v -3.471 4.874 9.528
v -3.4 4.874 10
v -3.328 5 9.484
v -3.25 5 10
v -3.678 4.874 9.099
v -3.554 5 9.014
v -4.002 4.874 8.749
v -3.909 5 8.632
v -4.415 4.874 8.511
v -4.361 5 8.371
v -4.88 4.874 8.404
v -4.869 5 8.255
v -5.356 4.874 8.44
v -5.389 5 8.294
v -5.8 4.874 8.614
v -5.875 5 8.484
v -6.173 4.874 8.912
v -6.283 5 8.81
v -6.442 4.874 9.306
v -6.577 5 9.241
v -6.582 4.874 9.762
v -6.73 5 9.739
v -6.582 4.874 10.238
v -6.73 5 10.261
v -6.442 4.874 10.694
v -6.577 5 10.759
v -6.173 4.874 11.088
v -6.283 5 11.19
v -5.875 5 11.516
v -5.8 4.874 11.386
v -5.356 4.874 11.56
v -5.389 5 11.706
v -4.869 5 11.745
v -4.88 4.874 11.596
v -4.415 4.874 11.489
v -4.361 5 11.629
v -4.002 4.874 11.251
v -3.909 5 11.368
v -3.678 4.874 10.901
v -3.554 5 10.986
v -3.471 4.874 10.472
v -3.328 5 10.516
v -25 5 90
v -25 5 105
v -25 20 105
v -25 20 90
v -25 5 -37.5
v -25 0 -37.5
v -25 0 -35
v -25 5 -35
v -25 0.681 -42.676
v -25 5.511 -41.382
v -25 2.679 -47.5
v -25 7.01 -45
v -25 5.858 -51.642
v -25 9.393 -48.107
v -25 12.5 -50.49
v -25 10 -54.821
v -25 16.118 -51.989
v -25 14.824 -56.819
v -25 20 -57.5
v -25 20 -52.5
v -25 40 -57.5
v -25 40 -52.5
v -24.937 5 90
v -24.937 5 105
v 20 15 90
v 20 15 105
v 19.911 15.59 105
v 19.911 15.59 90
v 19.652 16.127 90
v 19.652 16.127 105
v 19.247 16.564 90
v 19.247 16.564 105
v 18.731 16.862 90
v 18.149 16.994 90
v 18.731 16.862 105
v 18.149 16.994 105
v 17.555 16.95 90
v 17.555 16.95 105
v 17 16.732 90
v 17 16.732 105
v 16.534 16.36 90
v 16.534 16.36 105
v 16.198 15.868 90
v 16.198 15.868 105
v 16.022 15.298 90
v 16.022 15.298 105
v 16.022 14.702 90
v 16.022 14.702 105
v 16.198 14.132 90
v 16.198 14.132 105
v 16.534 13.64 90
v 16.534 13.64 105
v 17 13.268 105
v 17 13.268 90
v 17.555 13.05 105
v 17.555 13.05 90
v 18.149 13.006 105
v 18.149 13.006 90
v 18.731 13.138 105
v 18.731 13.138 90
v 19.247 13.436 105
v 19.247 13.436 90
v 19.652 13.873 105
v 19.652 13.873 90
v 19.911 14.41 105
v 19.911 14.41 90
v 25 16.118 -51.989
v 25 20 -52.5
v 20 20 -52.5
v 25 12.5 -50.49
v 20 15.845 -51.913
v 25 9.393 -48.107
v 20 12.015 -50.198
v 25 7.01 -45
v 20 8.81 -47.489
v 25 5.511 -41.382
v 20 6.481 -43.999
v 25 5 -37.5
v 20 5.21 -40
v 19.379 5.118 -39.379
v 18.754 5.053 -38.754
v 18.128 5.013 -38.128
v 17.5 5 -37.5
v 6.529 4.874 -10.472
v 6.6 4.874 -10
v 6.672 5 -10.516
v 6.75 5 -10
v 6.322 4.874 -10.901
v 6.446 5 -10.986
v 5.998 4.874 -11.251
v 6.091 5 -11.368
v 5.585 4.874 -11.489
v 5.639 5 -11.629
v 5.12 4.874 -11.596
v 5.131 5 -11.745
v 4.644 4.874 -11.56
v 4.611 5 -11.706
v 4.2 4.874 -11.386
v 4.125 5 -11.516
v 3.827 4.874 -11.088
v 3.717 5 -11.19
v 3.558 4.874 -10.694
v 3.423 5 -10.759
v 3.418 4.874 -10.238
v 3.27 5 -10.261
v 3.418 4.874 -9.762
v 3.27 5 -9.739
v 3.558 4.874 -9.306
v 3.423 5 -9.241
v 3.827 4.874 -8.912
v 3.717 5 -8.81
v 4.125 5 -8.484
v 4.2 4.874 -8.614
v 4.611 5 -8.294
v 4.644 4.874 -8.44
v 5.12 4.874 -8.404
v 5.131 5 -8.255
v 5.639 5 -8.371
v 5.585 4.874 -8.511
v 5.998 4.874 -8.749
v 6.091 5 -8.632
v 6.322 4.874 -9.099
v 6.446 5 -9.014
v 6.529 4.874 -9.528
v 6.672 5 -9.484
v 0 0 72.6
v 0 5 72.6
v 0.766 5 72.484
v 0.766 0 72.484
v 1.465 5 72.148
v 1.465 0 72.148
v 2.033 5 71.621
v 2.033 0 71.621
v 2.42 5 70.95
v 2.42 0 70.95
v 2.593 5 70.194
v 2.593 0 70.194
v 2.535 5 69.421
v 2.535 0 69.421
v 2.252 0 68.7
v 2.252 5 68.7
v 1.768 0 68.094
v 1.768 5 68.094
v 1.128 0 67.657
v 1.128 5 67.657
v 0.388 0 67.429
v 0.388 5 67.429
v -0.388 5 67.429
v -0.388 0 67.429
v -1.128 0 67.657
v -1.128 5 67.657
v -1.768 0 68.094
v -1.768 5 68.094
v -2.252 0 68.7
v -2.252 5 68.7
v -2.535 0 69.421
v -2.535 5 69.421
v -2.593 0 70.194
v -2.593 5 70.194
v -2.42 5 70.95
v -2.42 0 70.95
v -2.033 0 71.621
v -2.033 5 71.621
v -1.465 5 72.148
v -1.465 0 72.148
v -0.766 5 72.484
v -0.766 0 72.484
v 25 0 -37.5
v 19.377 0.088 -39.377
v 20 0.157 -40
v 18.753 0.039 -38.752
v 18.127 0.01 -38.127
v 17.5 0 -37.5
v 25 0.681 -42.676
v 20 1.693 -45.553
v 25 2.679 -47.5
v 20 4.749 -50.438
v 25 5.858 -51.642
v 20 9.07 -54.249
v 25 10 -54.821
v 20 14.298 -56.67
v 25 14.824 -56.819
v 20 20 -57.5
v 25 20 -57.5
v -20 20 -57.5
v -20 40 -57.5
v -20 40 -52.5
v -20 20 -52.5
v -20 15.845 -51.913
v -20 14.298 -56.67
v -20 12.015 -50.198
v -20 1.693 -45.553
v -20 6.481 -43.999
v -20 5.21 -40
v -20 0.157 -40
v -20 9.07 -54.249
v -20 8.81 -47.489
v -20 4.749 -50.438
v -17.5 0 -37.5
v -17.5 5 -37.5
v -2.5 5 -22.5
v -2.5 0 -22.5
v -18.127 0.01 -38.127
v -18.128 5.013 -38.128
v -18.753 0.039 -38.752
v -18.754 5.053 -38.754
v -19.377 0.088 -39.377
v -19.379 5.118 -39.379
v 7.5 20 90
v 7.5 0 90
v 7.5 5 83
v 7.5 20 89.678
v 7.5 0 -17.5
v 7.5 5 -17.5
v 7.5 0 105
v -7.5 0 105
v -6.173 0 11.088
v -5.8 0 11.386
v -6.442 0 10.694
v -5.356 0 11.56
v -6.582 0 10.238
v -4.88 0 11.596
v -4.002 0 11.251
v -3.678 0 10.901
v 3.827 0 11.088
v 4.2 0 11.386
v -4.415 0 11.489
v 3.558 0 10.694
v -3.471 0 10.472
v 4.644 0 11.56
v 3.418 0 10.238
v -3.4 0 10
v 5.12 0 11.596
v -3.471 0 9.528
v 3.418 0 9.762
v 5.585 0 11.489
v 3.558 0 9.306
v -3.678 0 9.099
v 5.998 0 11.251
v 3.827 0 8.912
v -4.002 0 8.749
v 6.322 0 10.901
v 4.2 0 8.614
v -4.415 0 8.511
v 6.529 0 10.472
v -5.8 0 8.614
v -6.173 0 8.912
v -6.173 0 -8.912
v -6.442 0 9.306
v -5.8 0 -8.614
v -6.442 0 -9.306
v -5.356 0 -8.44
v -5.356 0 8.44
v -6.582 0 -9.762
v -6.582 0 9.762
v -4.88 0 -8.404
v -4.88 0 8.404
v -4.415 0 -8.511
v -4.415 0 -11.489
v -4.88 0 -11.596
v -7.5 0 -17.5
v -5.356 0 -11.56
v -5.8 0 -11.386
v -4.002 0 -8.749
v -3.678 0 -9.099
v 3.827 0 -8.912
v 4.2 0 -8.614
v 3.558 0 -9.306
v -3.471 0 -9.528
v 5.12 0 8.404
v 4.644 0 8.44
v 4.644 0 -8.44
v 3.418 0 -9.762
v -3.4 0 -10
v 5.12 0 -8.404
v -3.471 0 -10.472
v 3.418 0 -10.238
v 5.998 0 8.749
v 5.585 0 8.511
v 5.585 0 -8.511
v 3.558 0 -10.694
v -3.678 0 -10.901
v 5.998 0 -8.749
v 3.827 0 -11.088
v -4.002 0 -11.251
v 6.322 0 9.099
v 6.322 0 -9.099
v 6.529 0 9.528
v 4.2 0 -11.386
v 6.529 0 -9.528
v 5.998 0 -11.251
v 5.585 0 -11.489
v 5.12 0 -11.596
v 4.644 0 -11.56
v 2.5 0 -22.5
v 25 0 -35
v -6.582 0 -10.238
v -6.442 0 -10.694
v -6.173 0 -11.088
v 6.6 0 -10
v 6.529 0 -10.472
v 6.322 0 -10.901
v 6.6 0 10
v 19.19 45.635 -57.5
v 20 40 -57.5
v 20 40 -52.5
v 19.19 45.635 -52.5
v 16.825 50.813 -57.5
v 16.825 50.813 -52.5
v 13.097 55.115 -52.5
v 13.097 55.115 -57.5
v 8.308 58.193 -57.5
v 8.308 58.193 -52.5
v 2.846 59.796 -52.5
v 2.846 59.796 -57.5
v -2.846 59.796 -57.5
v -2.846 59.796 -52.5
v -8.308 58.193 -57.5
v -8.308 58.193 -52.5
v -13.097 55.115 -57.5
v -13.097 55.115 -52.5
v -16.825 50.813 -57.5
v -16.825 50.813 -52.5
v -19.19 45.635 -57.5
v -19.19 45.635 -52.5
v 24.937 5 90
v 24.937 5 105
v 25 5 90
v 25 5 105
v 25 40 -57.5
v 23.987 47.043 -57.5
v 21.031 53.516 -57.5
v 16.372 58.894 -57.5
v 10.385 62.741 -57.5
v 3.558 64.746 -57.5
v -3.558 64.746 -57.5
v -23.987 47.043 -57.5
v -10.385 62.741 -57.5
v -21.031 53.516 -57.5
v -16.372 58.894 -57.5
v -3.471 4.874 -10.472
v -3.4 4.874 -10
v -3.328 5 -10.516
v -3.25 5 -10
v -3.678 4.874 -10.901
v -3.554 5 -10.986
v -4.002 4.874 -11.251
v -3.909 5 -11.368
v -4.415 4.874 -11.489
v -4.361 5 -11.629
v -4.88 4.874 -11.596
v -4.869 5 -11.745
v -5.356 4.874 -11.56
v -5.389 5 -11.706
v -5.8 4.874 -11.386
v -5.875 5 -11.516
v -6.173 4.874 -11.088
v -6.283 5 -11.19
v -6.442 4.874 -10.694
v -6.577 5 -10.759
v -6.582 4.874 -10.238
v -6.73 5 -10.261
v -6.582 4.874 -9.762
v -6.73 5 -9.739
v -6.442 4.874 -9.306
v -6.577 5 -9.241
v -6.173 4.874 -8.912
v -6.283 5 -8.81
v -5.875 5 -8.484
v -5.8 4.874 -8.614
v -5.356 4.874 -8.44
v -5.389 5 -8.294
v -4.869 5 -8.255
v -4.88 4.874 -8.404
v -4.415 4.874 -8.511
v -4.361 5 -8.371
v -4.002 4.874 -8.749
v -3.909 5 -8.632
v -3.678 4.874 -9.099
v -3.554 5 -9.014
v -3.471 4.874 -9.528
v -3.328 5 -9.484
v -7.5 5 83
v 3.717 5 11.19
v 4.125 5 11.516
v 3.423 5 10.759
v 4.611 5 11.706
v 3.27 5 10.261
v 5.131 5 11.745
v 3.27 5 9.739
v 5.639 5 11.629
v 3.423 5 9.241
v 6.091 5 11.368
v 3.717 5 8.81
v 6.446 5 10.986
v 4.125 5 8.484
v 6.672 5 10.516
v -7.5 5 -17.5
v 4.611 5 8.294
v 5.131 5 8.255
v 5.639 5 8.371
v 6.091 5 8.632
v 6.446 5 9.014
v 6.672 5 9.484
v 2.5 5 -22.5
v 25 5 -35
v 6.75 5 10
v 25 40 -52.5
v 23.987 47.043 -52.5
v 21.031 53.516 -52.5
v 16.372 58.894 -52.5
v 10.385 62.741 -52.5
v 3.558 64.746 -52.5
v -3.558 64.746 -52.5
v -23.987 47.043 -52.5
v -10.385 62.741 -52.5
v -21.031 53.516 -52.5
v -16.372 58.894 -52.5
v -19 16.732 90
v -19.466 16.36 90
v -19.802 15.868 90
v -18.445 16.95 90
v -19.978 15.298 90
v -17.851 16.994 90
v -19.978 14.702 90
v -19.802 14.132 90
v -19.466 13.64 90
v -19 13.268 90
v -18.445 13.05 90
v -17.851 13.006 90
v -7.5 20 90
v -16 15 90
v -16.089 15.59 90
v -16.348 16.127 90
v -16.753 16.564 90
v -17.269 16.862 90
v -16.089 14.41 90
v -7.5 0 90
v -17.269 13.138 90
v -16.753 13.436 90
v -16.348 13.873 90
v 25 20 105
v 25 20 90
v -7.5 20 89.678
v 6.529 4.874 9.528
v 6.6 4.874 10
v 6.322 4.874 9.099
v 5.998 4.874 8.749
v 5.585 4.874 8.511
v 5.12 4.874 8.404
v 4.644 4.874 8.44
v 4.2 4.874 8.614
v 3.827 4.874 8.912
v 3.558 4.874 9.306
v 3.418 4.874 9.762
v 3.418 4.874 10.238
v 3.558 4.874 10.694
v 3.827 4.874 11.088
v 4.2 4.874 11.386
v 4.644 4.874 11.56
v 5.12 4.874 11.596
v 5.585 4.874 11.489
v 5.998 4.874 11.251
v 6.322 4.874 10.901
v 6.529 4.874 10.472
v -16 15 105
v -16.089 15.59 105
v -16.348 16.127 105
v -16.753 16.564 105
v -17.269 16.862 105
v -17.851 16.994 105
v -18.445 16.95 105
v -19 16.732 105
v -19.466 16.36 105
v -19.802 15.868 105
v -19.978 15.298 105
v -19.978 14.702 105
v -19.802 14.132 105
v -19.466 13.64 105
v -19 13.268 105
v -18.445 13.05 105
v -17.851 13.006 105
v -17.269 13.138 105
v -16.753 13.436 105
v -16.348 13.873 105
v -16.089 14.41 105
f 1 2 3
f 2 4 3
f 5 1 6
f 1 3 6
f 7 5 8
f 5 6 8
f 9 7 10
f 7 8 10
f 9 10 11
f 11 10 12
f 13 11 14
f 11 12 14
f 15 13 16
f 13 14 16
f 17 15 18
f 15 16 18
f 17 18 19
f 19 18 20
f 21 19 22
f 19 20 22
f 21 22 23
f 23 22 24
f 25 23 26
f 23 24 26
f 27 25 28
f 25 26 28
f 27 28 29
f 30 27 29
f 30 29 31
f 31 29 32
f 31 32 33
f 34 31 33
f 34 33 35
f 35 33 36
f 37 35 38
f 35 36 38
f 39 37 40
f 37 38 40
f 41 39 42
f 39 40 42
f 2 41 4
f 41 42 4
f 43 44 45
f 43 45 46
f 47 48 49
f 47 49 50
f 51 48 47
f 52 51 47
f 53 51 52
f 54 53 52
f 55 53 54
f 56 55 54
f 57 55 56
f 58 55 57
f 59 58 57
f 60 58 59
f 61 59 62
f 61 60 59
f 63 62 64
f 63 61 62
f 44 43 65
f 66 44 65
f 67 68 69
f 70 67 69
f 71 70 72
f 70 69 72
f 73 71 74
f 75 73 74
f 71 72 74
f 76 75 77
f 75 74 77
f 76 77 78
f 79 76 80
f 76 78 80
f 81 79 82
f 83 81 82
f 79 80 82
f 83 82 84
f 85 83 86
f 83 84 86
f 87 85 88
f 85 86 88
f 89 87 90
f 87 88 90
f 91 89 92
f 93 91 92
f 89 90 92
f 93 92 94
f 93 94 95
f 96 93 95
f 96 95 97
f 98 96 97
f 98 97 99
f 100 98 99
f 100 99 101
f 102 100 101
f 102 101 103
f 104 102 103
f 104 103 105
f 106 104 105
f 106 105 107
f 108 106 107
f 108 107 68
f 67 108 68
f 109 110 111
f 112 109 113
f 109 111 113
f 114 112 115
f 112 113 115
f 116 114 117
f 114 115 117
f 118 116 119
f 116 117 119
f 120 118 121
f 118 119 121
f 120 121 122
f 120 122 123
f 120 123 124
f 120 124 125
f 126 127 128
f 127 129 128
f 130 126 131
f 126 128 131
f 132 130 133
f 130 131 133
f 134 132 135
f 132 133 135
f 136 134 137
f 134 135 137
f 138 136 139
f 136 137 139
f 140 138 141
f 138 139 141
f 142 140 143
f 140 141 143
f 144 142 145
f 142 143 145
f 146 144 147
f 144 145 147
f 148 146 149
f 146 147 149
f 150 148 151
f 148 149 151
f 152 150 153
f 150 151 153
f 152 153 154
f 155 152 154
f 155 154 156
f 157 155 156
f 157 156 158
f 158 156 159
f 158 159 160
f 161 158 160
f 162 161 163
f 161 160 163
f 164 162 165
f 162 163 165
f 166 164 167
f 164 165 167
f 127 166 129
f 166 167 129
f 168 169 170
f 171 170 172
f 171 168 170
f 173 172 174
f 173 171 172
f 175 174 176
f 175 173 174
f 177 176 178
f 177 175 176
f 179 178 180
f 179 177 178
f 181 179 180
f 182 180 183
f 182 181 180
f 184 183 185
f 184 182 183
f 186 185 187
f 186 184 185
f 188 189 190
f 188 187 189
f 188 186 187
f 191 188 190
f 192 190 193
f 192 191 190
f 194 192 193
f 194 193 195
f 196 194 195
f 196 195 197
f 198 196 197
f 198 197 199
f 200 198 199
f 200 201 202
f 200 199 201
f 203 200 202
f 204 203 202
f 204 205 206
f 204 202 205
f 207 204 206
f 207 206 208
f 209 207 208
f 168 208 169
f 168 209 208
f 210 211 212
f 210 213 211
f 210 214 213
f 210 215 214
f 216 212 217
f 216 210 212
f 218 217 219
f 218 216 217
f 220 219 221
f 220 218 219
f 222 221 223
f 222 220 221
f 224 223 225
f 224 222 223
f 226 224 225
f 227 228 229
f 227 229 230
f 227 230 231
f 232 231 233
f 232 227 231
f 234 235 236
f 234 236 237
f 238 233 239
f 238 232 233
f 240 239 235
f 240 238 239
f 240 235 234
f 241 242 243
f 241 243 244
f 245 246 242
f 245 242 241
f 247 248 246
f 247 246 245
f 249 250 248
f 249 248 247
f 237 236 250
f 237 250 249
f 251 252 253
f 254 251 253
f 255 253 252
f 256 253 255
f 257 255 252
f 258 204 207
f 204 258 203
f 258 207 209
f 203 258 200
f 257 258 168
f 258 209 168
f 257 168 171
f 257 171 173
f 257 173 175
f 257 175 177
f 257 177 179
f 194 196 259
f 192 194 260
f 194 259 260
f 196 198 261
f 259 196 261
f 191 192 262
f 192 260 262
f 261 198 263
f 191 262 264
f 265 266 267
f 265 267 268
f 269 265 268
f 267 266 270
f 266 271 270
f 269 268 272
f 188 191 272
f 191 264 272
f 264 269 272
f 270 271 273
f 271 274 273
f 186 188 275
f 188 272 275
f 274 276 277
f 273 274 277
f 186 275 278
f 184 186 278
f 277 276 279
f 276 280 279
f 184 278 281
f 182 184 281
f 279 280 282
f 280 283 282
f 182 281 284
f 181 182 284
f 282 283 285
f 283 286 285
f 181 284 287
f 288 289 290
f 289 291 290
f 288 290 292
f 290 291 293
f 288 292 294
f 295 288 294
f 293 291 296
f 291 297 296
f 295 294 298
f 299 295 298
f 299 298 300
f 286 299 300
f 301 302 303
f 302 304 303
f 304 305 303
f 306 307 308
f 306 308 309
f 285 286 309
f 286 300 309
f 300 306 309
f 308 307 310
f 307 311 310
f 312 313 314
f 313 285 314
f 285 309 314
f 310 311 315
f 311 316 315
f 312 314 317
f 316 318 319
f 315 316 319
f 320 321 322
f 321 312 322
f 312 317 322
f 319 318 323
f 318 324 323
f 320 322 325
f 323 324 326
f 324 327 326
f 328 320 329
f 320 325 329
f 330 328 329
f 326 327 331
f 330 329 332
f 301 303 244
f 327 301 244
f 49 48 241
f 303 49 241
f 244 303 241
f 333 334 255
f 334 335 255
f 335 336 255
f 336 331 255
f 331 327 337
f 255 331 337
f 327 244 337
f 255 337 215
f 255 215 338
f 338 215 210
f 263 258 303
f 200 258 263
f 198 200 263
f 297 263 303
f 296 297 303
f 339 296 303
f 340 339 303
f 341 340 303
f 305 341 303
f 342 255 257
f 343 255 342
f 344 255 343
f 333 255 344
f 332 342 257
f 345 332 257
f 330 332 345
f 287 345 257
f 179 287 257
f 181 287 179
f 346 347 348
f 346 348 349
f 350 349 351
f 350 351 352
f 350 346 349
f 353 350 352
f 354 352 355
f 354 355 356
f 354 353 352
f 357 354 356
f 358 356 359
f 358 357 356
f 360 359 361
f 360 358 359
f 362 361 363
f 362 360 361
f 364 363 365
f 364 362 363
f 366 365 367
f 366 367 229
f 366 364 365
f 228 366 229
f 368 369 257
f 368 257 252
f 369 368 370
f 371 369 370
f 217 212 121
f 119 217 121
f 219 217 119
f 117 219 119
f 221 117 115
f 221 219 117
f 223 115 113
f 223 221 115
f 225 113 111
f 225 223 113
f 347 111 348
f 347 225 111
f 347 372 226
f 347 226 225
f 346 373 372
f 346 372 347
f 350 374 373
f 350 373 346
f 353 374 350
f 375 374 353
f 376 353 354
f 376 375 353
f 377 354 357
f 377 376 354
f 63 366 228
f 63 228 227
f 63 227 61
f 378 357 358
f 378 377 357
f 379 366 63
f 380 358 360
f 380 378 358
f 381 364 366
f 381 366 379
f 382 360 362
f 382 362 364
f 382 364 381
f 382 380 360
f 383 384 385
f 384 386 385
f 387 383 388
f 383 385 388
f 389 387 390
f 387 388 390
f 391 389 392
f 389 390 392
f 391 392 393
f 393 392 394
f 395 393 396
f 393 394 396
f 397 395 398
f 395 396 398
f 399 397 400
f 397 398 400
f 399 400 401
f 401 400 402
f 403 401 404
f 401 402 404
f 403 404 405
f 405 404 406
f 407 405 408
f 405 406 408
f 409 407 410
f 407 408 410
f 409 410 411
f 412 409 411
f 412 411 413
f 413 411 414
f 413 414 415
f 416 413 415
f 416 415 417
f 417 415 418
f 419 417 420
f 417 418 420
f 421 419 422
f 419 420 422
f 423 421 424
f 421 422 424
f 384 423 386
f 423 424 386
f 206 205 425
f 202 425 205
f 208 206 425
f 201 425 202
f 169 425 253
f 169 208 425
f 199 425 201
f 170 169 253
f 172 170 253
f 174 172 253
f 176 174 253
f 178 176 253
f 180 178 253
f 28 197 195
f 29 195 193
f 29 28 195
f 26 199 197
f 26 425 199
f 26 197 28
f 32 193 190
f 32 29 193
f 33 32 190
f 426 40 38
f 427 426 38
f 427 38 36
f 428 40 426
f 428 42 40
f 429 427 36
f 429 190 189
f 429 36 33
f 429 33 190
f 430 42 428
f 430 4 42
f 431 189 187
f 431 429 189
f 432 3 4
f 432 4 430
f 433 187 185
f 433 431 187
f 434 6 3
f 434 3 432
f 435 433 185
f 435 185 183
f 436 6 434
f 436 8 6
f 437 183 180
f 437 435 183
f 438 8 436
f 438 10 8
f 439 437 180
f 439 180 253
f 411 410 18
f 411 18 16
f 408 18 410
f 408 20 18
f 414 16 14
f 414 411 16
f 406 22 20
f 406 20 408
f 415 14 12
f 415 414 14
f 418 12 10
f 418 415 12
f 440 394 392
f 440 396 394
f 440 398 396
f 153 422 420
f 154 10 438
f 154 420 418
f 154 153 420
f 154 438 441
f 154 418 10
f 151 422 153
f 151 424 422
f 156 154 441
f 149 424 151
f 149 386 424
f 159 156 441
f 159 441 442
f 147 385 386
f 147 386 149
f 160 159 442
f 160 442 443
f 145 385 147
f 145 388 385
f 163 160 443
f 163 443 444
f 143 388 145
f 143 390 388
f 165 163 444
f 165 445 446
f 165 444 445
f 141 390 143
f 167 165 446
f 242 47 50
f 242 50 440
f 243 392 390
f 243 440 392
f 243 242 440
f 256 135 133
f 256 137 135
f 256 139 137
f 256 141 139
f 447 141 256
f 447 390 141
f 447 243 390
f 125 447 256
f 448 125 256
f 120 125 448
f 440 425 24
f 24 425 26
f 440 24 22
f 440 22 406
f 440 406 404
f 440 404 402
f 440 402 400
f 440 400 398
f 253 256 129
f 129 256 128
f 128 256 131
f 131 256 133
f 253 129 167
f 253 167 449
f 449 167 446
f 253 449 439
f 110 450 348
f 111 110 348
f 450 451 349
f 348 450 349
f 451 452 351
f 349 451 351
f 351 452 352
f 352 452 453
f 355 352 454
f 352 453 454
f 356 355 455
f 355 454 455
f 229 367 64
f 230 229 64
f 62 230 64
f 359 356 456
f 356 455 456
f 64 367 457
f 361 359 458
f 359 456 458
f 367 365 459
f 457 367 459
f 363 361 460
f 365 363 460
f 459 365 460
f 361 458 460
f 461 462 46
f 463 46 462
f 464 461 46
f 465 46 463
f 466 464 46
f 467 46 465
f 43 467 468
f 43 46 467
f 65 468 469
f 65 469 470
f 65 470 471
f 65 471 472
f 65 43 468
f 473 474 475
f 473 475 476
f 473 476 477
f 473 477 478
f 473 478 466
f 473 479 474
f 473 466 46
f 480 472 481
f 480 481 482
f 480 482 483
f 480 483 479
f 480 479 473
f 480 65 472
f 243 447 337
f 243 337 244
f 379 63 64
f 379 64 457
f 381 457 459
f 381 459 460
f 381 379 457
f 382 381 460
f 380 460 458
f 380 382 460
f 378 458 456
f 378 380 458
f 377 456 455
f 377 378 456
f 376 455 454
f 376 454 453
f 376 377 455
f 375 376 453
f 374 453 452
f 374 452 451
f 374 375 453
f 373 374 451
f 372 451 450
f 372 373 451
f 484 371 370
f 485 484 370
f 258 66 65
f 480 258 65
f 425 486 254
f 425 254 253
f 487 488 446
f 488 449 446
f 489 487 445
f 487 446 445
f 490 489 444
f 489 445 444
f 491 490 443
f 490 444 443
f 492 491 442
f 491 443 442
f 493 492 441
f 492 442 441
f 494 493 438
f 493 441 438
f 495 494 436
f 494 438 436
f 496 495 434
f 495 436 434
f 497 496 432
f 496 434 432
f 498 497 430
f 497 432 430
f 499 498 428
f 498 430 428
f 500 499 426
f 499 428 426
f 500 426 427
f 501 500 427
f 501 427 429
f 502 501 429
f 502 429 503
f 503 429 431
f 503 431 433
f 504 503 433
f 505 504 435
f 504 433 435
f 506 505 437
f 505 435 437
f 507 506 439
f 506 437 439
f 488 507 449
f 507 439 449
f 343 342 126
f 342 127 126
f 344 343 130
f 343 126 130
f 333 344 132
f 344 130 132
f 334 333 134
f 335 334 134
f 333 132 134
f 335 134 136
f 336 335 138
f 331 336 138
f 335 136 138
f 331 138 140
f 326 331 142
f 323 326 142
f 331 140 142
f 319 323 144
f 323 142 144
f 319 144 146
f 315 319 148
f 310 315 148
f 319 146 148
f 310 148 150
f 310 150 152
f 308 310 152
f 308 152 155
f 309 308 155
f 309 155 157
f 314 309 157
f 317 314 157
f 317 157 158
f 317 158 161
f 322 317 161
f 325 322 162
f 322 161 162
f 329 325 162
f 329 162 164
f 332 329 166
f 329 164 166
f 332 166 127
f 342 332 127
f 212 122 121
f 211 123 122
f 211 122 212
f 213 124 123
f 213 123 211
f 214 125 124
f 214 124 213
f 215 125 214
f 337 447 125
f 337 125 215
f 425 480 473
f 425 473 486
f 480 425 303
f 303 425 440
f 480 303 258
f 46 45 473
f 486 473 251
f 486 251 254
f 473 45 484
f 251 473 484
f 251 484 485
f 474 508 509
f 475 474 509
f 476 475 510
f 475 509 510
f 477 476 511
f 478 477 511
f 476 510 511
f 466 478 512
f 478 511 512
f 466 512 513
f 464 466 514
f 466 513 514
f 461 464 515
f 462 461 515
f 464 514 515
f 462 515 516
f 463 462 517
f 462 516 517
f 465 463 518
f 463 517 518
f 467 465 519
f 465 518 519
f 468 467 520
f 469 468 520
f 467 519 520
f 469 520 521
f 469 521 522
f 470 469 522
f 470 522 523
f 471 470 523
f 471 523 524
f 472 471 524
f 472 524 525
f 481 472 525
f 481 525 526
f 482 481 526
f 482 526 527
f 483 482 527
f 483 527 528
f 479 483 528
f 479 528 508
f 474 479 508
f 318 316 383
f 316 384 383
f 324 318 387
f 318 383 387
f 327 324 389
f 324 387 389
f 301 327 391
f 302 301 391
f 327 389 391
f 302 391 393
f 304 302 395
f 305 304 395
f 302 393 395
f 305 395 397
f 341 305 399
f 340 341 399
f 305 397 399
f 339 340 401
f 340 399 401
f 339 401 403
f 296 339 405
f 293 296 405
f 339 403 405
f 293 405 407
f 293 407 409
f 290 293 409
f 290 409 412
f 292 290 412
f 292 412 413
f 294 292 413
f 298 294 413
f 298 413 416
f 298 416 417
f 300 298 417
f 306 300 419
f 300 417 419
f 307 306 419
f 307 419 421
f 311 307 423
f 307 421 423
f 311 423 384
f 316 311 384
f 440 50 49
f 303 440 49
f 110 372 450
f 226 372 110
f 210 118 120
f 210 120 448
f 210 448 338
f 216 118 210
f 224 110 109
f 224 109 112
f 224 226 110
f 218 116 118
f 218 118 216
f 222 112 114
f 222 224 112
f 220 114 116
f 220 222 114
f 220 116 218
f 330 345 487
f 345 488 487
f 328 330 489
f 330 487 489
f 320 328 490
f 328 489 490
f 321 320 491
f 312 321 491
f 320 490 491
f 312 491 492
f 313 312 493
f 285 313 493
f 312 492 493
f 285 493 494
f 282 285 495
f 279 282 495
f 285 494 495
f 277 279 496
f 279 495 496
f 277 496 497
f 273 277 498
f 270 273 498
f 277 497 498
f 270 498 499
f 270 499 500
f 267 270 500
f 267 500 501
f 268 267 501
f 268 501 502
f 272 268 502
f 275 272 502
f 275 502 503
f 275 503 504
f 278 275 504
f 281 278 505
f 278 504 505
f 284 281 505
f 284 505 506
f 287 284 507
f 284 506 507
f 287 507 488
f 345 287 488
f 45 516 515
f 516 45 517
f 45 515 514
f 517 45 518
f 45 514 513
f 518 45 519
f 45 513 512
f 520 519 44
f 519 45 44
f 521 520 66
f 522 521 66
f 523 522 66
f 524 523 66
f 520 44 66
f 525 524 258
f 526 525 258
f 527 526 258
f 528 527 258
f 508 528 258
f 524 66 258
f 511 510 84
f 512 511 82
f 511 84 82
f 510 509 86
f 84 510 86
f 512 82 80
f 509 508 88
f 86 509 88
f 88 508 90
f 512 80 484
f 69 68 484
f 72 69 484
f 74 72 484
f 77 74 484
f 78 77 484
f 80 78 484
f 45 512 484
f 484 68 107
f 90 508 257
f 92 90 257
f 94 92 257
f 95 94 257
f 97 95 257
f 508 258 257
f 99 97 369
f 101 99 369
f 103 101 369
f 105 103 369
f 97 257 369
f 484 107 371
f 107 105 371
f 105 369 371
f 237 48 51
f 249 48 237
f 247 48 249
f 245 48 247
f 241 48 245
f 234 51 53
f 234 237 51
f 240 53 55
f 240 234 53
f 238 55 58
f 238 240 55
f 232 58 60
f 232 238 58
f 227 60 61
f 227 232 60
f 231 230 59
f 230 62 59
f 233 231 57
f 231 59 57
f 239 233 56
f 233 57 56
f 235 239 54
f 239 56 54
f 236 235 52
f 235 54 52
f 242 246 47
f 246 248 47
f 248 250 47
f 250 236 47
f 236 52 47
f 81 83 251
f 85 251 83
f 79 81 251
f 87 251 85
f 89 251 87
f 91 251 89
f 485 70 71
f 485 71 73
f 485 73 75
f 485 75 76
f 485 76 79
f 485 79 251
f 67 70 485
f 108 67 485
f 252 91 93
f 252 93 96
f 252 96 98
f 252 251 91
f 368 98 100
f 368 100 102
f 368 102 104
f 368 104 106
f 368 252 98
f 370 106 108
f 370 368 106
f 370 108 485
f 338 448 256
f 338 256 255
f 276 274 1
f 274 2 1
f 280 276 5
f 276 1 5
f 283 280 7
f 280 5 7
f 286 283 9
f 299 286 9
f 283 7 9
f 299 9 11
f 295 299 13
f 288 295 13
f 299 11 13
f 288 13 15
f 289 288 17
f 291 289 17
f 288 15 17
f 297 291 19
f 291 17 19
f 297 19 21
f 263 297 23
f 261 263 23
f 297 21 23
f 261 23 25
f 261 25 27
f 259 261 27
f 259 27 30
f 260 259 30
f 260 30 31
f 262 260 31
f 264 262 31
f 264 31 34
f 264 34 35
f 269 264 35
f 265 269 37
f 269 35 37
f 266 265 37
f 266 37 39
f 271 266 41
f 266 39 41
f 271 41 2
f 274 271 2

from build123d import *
from OCP.BRepFilletAPI import BRepFilletAPI_MakeChamfer

# Parameters (mm, degrees)
SKETCH1_W           = 15
SKETCH1_H           = 27.5
SKETCH1_W_2         = 10
SKETCH1_H_2         = 20
BOSS_EXTRUDE1_DEPTH = 5
SKETCH8_W           = 15
SKETCH8_H           = 90
BOSS_EXTRUDE2_DEPTH = 5
SKETCH9_R           = 2.6
CUT_EXTRUDE1_DEPTH  = 11
SKETCH11_W          = 50
SKETCH11_H          = 15
BOSS_EXTRUDE4_DEPTH = 15
CHAMFER1_SIZE       = 5
CHAMFER1_SIZE_2     = 17.437072219
CHAMFER2_SIZE       = 15.722257417
CHAMFER2_SIZE_2     = 7
SKETCH12_R          = 2
CUT_EXTRUDE2_DEPTH  = 122.783619588
SKETCH13_W          = 15
SKETCH13_H          = 10
BOSS_EXTRUDE5_DEPTH = 5
SKETCH15_W          = 5
SKETCH15_H          = 35
BOSS_EXTRUDE7_DEPTH = 5
BOSS_EXTRUDE8_DEPTH = 5
FILLET1_R           = 15
FILLET2_R           = 20
CHAMFER3_SIZE       = 17.5


# Read off the part's stored shape, not the designer's step: Ø3.0mm Dowel Hole1
# Some blends are built 0.0001 mm under size
with BuildPart() as part:
    # Sketch1 → Boss-Extrude1 (new body)
    # profile 1 of 2: a face of its own
    with BuildSketch(Plane(origin=(0, 0, 0), x_dir=(1, 0, 0), z_dir=(0, 1, 0))):
        with Locations((0, -1.25)):
            Rectangle(SKETCH1_W, SKETCH1_H)
        Rectangle(SKETCH1_W_2, SKETCH1_H_2, mode=Mode.SUBTRACT)
    # profile 2 of 2: a face of its own
    with BuildSketch(Plane(origin=(0, 0, 0), x_dir=(1, 0, 0), z_dir=(0, 1, 0))):
        Rectangle(SKETCH1_W_2, SKETCH1_H_2)
    extrude(amount=BOSS_EXTRUDE1_DEPTH)

    # Ø3.0mm Dowel Hole1 outline → Ø3.0mm Dowel Hole1 (revolve, cut)
    with BuildSketch(Plane(origin=(5, 0, -10), x_dir=(1, 0, 0), z_dir=(0, 0, 1))):
        Polygon((0, 0), (1.6, 0), (1.6, 4.874135055), (1.75, 5), (0, 5), align=None)
    revolve(axis=Axis((5, 0, -10), (0, 1, 0)), mode=Mode.SUBTRACT)

    # 3.0mm Dowel Hole1 2 outline → 3.0mm Dowel Hole1 2 (revolve, cut)
    with BuildSketch(Plane(origin=(-5, 0, 10), x_dir=(1, 0, 0), z_dir=(0, 0, 1))):
        Polygon((0, 0), (1.6, 0), (1.6, 4.874135055), (1.75, 5), (0, 5), align=None)
    revolve(axis=Axis((-5, 0, 10), (0, 1, 0)), mode=Mode.SUBTRACT)

    # 3.0mm Dowel Hole1 3 outline → 3.0mm Dowel Hole1 3 (revolve, cut)
    with BuildSketch(Plane(origin=(-5, 0, -10), x_dir=(1, 0, 0), z_dir=(0, 0, 1))):
        Polygon((0, 0), (1.6, 0), (1.6, 4.874135055), (1.75, 5), (0, 5), align=None)
    revolve(axis=Axis((-5, 0, -10), (0, 1, 0)), mode=Mode.SUBTRACT)

    # 3.0mm Dowel Hole1 4 outline → 3.0mm Dowel Hole1 4 (revolve, cut)
    with BuildSketch(Plane(origin=(5, 0, 10), x_dir=(1, 0, 0), z_dir=(0, 0, 1))):
        Polygon((0, 0), (1.6, 0), (1.6, 4.874135055), (1.75, 5), (0, 5), align=None)
    revolve(axis=Axis((5, 0, 10), (0, 1, 0)), mode=Mode.SUBTRACT)

    # Sketch8 → Boss-Extrude2 (add)
    with BuildSketch(Plane(origin=(0, 5, 0), x_dir=(1, 0, 0), z_dir=(0, 1, 0))):
        with Locations((0, -60)):
            Rectangle(SKETCH8_W, SKETCH8_H)
    extrude(amount=-BOSS_EXTRUDE2_DEPTH)

    # Sketch9 → Cut-Extrude1 (cut)
    with BuildSketch(Plane(origin=(0, 0, 0), x_dir=(1, 0, 0), z_dir=(0, 1, 0))):
        with Locations(Location((0, -70, 0), (0, 0, 270))):
            Circle(SKETCH9_R)
    extrude(amount=CUT_EXTRUDE1_DEPTH, mode=Mode.SUBTRACT)

    # Sketch11 → Boss-Extrude4 (add)
    with BuildSketch(Plane(origin=(0, 5, 0), x_dir=(1, 0, 0), z_dir=(0, 1, 0))):
        with Locations((0, -97.5)):
            Rectangle(SKETCH11_W, SKETCH11_H)
    extrude(amount=BOSS_EXTRUDE4_DEPTH)

    # Chamfer1
    chamfer1_edges_1 = [part.edges().sort_by_distance(p)[0] for p in [
        (7.5, 5, 97.5),
    ]]
    chamfer1_side_1 = [part.faces().sort_by_distance(p)[0] for p in [
        (7.5, 4.9, 97.5),
    ]]
    chamfer1_edges_2 = [part.edges().sort_by_distance(p)[0] for p in [
        (-7.5, 5, 97.5),
    ]]
    chamfer1_side_2 = [part.faces().sort_by_distance(p)[0] for p in [
        (-7.5, 4.9, 97.5),
    ]]
    chamfer1 = BRepFilletAPI_MakeChamfer(part.part.solid().wrapped)
    for e in chamfer1_edges_1:
        chamfer1.Add(CHAMFER1_SIZE - 0.0001, CHAMFER1_SIZE_2 - 0.0001, e.wrapped, chamfer1_side_1[0].wrapped)
    for e in chamfer1_edges_2:
        chamfer1.Add(CHAMFER1_SIZE - 0.0001, CHAMFER1_SIZE_2 - 0.0001, e.wrapped, chamfer1_side_2[0].wrapped)
    add(Compound.cast(chamfer1.Shape()), mode=Mode.REPLACE)  # a hair under: the kernel refuses the full size

    # Chamfer2
    # the kernel refuses this chamfer: 15.722257417, 7 mm, written as the material it adds along each edge
    with BuildSketch(Plane(origin=(-7.5, 5, 90), x_dir=(0, 0.9998768419809391, 0.015693975602887097), z_dir=(1, 0, 0))) as chamfer2_piece_1_section:
        Polygon((CHAMFER2_SIZE * 0.999876842002, -CHAMFER2_SIZE * 0.0156939756032), (-CHAMFER2_SIZE_2 * 0.0156939756029, -CHAMFER2_SIZE_2 * 0.999876841981), (0, 0), align=None)
    chamfer2_piece_1 = extrude(amount=15, mode=Mode.PRIVATE)
    chamfer2_piece_1 = split(chamfer2_piece_1, bisect_by=Plane(origin=(0, 20, 87.661958793), z_dir=(0, -1, 0)), keep=Keep.TOP, mode=Mode.PRIVATE)
    add(chamfer2_piece_1)

    # Sketch12 → Cut-Extrude2 (cut, through all)
    with BuildSketch(Plane.XY.offset(105)):
        with Locations((-18, 15)):
            Circle(SKETCH12_R)
        with Locations((18, 15)):
            Circle(SKETCH12_R)
    extrude(amount=-CUT_EXTRUDE2_DEPTH, mode=Mode.SUBTRACT)

    # Sketch13 → Boss-Extrude5 (add)
    with BuildSketch(Plane(origin=(0, 5, 0), x_dir=(1, 0, 0), z_dir=(0, 1, 0))):
        with Locations((0, 17.5)):
            Rectangle(SKETCH13_W, SKETCH13_H)
    extrude(amount=-BOSS_EXTRUDE5_DEPTH)

    # Sketch15 → Boss-Extrude7 (add)
    with BuildSketch(Plane(origin=(0, 5, 0), x_dir=(1, 0, 0), z_dir=(0, 1, 0))):
        with Locations((-22.5, 40)):
            Rectangle(SKETCH15_W, SKETCH15_H)
        Polygon((-7.5, 17.5), (-7.5, 22.5), (-20, 22.5), (-25, 22.5), (-25, 17.5), align=None)
        Polygon((25, 17.5), (25, 22.5), (20, 22.5), (7.5, 22.5), (7.5, 17.5), align=None)
        with Locations((22.5, 40)):
            Rectangle(SKETCH15_W, SKETCH15_H)
    extrude(amount=-BOSS_EXTRUDE7_DEPTH)

    # Sketch16 → Boss-Extrude8 (add)
    with BuildSketch(Plane(origin=(0, 0, -57.5), x_dir=(-1, 0, 0), z_dir=(0, 0, -1))):
        with BuildLine():
            Line((-20, 40), (-25, 40))
            ThreePointArc((-25, 40), (-23.717082451, 32.09430585), (-20, 25))
            Line((-20, 25), (-20, 40))
        make_face()
        with BuildLine():
            Line((20, 40), (25, 40))
            ThreePointArc((25, 40), (0, 65), (-25, 40))
            Line((-25, 40), (-20, 40))
            ThreePointArc((-20, 40), (0, 60), (20, 40))
        make_face()
        with BuildLine():
            ThreePointArc((20, 25), (23.717082451, 32.09430585), (25, 40))
            Line((25, 40), (20, 40))
            Line((20, 40), (20, 25))
        make_face()
        with BuildLine():
            Line((20, 5), (25, 5))
            Line((25, 5), (25, 40))
            ThreePointArc((25, 40), (23.717082451, 32.09430585), (20, 25))
            Line((20, 25), (20, 5))
        make_face()
        with BuildLine():
            ThreePointArc((-20, 25), (-23.717082451, 32.09430585), (-25, 40))
            Line((-25, 40), (-25, 0))
            Line((-25, 0), (-20, 0))
            Line((-20, 0), (-20, 25))
        make_face()
    extrude(amount=-BOSS_EXTRUDE8_DEPTH)

    # Fillet1
    fillet1_edges = [part.edges().sort_by_distance(p)[0] for p in [
        (-22.5, 5, -52.5),
        (22.5, 5, -52.5),
    ]]
    fillet(fillet1_edges, radius=FILLET1_R)

    # Fillet2
    fillet2_edges = [part.edges().sort_by_distance(p)[0] for p in [
        (-22.5, 0, -57.5),
        (22.5, 0, -57.5),
    ]]
    fillet(fillet2_edges, radius=FILLET2_R)

    # Chamfer3
    chamfer3_edges = [part.edges().sort_by_distance(p)[0] for p in [
        (-25, 2.5, -17.5),
        (-20, 2.5, -22.5),
        (25, 2.5, -17.5),
        (20, 2.5, -22.5),
    ]]
    chamfer(chamfer3_edges, length=CHAMFER3_SIZE - 0.0001)  # a hair under: the kernel refuses the full size


solid = part.part
